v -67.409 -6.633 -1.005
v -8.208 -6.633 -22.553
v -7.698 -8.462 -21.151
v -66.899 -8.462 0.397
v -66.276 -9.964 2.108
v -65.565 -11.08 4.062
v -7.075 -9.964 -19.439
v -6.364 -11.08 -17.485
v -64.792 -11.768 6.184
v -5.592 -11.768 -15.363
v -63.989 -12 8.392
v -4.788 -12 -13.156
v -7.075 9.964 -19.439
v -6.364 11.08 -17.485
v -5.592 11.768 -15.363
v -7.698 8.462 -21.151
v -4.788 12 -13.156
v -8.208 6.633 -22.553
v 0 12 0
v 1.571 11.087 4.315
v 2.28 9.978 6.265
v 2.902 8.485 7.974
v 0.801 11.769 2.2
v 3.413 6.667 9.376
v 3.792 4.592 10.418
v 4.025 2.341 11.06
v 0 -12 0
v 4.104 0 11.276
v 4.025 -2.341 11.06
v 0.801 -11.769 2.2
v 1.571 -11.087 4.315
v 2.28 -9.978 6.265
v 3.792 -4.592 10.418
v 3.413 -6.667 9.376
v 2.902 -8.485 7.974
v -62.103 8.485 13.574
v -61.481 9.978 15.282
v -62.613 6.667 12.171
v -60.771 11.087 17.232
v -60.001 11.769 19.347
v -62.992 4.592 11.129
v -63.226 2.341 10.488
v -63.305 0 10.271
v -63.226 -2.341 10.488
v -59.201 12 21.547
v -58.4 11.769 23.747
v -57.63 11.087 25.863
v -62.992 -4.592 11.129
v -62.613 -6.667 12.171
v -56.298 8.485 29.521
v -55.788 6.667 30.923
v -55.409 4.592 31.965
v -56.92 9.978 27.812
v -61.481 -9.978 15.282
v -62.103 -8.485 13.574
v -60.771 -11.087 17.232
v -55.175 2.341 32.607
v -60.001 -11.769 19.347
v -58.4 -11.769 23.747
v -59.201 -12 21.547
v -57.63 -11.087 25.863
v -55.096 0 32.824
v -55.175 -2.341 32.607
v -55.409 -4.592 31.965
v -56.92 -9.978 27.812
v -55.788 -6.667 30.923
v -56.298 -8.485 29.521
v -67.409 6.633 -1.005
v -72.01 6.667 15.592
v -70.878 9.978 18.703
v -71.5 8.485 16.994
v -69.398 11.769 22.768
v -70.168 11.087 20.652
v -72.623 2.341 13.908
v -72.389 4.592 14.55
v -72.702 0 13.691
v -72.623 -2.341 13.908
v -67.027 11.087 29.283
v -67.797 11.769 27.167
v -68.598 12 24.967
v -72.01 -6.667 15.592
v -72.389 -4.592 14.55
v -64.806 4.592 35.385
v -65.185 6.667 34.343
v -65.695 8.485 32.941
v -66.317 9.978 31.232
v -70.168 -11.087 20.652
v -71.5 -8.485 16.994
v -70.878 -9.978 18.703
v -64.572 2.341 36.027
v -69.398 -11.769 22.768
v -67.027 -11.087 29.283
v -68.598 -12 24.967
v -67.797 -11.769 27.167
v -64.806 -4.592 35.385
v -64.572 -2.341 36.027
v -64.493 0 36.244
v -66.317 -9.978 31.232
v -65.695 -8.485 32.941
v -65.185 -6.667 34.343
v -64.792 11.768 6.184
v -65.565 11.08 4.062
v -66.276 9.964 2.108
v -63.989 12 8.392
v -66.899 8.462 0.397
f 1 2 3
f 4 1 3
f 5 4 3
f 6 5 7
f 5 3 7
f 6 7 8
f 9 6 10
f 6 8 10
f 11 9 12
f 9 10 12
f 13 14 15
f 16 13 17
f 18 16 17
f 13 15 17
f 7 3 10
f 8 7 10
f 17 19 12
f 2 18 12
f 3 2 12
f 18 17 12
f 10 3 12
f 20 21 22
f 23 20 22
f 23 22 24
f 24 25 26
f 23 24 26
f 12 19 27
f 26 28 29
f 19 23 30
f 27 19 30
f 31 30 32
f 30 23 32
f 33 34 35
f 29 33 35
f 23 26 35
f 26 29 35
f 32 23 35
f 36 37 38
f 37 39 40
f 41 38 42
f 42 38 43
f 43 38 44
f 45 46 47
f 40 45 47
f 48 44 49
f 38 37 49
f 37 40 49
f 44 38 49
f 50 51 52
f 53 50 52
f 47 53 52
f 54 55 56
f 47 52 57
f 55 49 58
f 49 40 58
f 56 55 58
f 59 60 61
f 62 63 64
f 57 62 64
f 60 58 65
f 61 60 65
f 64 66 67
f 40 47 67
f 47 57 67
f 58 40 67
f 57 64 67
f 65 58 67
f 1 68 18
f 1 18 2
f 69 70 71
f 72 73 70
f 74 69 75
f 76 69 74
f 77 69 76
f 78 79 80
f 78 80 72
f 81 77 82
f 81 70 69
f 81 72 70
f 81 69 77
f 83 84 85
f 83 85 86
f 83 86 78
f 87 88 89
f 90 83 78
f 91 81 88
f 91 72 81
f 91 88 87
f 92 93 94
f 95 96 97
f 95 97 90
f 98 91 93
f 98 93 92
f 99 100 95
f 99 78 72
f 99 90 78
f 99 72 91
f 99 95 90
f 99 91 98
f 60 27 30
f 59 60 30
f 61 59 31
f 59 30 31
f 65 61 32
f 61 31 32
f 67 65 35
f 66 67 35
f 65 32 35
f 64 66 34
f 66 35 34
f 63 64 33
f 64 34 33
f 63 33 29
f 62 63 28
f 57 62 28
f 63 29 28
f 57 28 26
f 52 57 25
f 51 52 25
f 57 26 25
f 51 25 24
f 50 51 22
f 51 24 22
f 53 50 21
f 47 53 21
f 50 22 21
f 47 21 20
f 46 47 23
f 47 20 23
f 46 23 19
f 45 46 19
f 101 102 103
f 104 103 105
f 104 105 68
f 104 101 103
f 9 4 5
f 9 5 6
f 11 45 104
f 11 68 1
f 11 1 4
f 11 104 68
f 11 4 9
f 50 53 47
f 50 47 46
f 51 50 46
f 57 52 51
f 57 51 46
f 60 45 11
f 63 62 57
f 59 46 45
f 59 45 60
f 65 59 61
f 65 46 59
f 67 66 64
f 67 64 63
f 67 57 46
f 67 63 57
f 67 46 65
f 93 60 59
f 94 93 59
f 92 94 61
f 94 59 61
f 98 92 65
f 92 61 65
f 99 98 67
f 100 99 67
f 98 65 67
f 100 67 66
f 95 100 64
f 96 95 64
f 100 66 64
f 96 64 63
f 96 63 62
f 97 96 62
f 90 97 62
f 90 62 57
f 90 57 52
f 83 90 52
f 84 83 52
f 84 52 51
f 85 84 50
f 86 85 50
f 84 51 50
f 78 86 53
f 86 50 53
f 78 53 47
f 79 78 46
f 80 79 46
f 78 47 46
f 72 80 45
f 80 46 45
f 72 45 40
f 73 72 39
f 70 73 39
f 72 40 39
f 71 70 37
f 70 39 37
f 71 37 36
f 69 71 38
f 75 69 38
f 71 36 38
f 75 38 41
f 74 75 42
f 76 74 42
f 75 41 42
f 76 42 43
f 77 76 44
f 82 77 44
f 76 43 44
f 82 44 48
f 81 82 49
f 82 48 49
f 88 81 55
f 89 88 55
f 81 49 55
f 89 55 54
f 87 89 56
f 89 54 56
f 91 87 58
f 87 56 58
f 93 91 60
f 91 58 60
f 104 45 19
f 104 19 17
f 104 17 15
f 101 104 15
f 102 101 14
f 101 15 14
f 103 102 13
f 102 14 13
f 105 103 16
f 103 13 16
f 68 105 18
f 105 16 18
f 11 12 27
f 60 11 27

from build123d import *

# Parameters (mm, degrees)
F4_START = 63
F4_DEPTH = 10
F5_DEPTH = 63


# Not quite as in the source:
# - the program builds the solid bodies; features that only make, move or delete a surface that nothing else refers to are left out


with BuildPart() as f4:
    # F3 (on line) → F4 (new body)
    with BuildSketch(Plane(origin=(0, 0, 0), x_dir=(0, -1, 0), z_dir=(-0.9396926208, 0, 0.3420201433)).offset(F4_START)):
        with BuildLine():
            ThreePointArc((-12, 0), (0, -12), (12, 0))
            ThreePointArc((12, 0), (0, 12), (-12, 0))
        make_face()
    extrude(amount=F4_DEPTH)


with BuildPart() as f5:
    # F3 (on line) → F5 (new body)
    with BuildSketch(Plane(origin=(0, 0, 0), x_dir=(0, -1, 0), z_dir=(-0.9396926208, 0, 0.3420201433))):
        with BuildLine():
            Line((12, -14), (12, 0))
            ThreePointArc((12, 0), (0, -12), (-12, 0))
            Line((-12, 0), (-12, -14))
            ThreePointArc((-12, -14), (-10.5735281474, -19.6745486619), (-6.6332495807, -24))
            Line((-6.6332495807, -24), (6.6332495807, -24))
            ThreePointArc((6.6332495807, -24), (10.5735281474, -19.6745486619), (12, -14))
        make_face()
        with BuildLine():
            ThreePointArc((-12, 0), (0, -12), (12, 0))
            ThreePointArc((12, 0), (0, 12), (-12, 0))
        make_face()
    extrude(amount=F5_DEPTH)


solid = Compound([f4.part, f5.part])
